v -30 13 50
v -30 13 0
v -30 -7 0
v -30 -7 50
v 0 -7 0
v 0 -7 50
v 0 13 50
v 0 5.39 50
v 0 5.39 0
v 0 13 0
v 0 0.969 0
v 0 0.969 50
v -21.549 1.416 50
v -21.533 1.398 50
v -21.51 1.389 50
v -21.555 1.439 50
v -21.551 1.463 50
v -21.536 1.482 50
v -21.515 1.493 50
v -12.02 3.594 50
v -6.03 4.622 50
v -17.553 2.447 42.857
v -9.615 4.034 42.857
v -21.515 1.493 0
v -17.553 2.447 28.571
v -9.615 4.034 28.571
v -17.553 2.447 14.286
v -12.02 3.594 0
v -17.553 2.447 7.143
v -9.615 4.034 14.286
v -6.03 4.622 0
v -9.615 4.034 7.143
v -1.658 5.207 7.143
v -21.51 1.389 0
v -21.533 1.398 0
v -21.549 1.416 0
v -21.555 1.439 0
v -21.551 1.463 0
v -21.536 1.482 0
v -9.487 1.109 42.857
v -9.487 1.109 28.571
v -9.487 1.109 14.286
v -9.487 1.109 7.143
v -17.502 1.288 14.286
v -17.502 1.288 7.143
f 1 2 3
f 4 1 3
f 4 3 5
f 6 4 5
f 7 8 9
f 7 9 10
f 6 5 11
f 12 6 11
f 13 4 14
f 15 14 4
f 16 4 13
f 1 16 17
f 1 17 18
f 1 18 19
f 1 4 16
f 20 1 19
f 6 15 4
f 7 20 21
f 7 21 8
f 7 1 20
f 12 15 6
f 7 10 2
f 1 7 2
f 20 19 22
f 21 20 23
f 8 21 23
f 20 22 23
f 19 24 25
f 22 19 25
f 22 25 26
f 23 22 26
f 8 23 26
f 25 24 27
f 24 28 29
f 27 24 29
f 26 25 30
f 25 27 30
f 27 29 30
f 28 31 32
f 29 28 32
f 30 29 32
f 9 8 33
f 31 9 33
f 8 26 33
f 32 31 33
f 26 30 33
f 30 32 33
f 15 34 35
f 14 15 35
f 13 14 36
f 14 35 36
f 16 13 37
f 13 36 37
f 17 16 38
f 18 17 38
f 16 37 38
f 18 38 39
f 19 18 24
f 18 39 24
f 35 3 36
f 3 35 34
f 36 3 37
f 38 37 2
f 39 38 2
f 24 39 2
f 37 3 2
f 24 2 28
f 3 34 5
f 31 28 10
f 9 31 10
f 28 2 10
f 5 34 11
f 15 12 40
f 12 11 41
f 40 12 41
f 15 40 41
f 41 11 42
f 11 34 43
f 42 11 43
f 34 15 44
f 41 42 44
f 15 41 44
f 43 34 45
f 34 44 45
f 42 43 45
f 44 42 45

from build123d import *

# Parameters (mm, degrees)
BOSS_EXTRUDE1_DEPTH = 50


with BuildPart() as part:
    # Sketch2 → Boss-Extrude1 (new body)
    with BuildSketch(Plane(origin=(17.440169359, 0, 0), x_dir=(1, 0, 0), z_dir=(0, 0, 1))):
        with BuildLine():
            Line((-17.440169359, 5.390357249), (-17.440169359, 13))
            Line((-17.440169359, 13), (-47.440169359, 13))
            Line((-47.440169359, 13), (-47.440169359, -7))
            Line((-47.440169359, -7), (-17.440169359, -7))
            Line((-17.440169359, -7), (-17.440169359, 0.968636761))
            add(Edge.make_bspline(
                [(-17.440169359, 0.968636761), (-17.931338117, 0.970701913), (-19.758058993, 0.983079263), (-22.920319296, 1.034346952), (-26.927143731, 1.108696119), (-30.934784115, 1.186054987), (-34.274352572, 1.272646837), (-36.946538119, 1.3352315), (-38.282562813, 1.371072371), (-38.950621034, 1.388994037)],
                knots=[0.736257198, 0.736257198, 0.736257198, 0.736257198, 0.754320379, 0.803437364, 0.852566096, 0.901700994, 0.950848809, 0.975422717, 1, 1, 1, 1], degree=3))
            ThreePointArc((-38.950621034, 1.388994037), (-38.995095838, 1.439101765), (-38.955157451, 1.492895053))
            add(Edge.make_bspline(
                [(-38.955157451, 1.492895053), (-38.295450211, 1.65836191), (-36.977768402, 1.98886104), (-34.338118745, 2.604088974), (-31.033670068, 3.302340733), (-27.061704408, 4.049112578), (-23.086249568, 4.700839132), (-19.876307317, 5.123163604), (-17.993272478, 5.332934001), (-17.440169359, 5.390357249)],
                knots=[0, 0, 0, 0, 0.02501249, 0.049959286, 0.099672925, 0.14920632, 0.198581097, 0.24780517, 0.26825455, 0.26825455, 0.26825455, 0.26825455], degree=3))
        make_face()
    extrude(amount=BOSS_EXTRUDE1_DEPTH)


solid = part.part
